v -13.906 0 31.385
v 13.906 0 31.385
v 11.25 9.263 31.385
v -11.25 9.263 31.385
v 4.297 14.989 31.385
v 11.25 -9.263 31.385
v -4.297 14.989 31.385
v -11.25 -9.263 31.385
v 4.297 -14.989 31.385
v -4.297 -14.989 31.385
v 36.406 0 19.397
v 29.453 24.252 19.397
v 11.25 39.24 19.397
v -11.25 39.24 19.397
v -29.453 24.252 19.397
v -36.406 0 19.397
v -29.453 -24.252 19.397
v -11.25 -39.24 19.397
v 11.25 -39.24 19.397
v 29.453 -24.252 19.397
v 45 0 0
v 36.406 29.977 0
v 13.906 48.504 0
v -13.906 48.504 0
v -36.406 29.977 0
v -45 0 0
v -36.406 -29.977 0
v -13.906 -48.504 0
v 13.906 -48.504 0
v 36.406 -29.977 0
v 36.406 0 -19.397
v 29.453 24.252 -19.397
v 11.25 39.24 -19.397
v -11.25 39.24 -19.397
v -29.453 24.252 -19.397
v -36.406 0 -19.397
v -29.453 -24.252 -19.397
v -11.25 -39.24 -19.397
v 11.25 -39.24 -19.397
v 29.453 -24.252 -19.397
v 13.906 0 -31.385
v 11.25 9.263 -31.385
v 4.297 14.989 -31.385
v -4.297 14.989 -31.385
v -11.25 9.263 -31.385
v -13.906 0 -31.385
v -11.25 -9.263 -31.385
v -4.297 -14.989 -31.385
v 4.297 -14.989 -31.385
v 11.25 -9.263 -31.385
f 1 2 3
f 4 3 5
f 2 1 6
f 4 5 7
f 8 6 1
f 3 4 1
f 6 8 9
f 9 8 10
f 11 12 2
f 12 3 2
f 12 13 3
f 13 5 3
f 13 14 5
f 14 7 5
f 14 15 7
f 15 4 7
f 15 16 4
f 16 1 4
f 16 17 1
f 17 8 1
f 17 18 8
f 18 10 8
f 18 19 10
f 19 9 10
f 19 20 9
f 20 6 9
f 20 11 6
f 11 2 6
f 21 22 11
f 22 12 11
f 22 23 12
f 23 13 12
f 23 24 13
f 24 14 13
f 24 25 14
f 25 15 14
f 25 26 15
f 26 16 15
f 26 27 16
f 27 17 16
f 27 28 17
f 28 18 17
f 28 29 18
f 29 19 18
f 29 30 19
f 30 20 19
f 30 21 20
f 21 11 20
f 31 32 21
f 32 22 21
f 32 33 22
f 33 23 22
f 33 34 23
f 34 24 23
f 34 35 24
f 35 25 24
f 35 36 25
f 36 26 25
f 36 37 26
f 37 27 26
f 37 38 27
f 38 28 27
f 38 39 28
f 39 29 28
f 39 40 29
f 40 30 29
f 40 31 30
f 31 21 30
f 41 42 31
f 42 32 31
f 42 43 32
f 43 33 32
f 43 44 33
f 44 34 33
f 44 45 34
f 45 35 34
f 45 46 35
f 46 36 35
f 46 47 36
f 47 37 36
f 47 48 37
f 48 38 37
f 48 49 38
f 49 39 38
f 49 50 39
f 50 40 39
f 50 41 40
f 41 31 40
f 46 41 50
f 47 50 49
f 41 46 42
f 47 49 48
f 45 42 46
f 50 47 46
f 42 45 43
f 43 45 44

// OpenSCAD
// Generated by SolidPython 1.0.1 on 2020-07-29 00:46:52


scale(v = [15, 17, 11]) {
	sphere(r = 3);
}
/***********************************************
*********      SolidPython code:      **********
************************************************
 
# import packages: SolidPython
from solid import *
from solid.utils import *
from itertools import chain, combinations, permutations


class Resize:

    def __init__(self, scad_file):
        self.scad_file = scad_file
        #self.scad_file = import_scad(scad_file)
        # cone/cylinder param:
        self.r1 = 0
        self.r2 = 0
        self.h = 0
        # rectangular prism param:
        self.w = 0
        self.l = 0
        # ellipse param:
        self.r = 0

    # import OpenScad code (file name corresponds to shape)


    # classify shape + parameters
    def assign(self, param1, param2, param3):
        if self.scad_file == 'cone.scad':
            self.r1 = param1
            self.r2 = param2
            self.h = param3
        elif self.scad_file == 'cylinder.scad':
            self.r1 = param1
            self.r2 = param2
            self.h = param3
        elif self.scad_file == 'rectangularPrism.scad':
            self.h = param1
            self.l = param2
            self.w = param3
        else:
            self.r = param1
            self.h = param2

    # resize parameters
    def iterate(self):
        x = range(3, 20, 2)
        i = 1
        if self.scad_file == 'cone.scad':
            tempList = list(permutations(x, 2))
            for temp in tempList:
                param1 = temp[0]
                param2 = temp[1]
                filepath = 'produced_scad_files/' + 'cone' + str(param1) + '_' + str(param2) + '_' + '.scad'
                scad_render_to_file(cylinder(h=param1, r1=param2, r2=0), filepath)

        elif self.scad_file == 'cylinder.scad':
            tempList = list(permutations(x, 3))
            for temp in tempList:
                param1 = temp[0]
                param2 = temp[1]
                filepath = 'produced_scad_files/' + 'cylinder' + str(param1) + '_' + str(param2) + '_' + '.scad'
                scad_render_to_file(cylinder(h=param1, r1=param2, r2=param2), filepath)

        elif self.scad_file == 'rectangularPrism.scad':
            tempList = list(permutations(x, 3))
            for temp in tempList:
                param1 = temp[0]
                param2 = temp[1]
                param3 = temp[2]
                filepath = 'produced_scad_files/' + 'rectangularPrism' + str(param1) + '_' + str(param2) + '_' + str(
                    param3) + '.scad'
                scad_render_to_file(cube(size=(param1, param2, param3)), filepath)

        elif self.scad_file == 'ellipse.scad':
            tempList = list(permutations(x, 4))
            for temp in tempList:
                param1 = temp[0]
                param2 = temp[1]
                param3 = temp[2]
                param4 = temp[3]
                filepath = 'produced_scad_files/' + 'ellipse' + str(param1) + '_' + str(param2) + '_' + str(param3) + '_' + str(param4) + '.scad'
                scad_render_to_file(scale([param1, param2, param3])(sphere(r=param4)), filepath)

    def render_to_scadfile(self):
        scad_render_to_file(scad, 'example.scad') 
 
************************************************/
